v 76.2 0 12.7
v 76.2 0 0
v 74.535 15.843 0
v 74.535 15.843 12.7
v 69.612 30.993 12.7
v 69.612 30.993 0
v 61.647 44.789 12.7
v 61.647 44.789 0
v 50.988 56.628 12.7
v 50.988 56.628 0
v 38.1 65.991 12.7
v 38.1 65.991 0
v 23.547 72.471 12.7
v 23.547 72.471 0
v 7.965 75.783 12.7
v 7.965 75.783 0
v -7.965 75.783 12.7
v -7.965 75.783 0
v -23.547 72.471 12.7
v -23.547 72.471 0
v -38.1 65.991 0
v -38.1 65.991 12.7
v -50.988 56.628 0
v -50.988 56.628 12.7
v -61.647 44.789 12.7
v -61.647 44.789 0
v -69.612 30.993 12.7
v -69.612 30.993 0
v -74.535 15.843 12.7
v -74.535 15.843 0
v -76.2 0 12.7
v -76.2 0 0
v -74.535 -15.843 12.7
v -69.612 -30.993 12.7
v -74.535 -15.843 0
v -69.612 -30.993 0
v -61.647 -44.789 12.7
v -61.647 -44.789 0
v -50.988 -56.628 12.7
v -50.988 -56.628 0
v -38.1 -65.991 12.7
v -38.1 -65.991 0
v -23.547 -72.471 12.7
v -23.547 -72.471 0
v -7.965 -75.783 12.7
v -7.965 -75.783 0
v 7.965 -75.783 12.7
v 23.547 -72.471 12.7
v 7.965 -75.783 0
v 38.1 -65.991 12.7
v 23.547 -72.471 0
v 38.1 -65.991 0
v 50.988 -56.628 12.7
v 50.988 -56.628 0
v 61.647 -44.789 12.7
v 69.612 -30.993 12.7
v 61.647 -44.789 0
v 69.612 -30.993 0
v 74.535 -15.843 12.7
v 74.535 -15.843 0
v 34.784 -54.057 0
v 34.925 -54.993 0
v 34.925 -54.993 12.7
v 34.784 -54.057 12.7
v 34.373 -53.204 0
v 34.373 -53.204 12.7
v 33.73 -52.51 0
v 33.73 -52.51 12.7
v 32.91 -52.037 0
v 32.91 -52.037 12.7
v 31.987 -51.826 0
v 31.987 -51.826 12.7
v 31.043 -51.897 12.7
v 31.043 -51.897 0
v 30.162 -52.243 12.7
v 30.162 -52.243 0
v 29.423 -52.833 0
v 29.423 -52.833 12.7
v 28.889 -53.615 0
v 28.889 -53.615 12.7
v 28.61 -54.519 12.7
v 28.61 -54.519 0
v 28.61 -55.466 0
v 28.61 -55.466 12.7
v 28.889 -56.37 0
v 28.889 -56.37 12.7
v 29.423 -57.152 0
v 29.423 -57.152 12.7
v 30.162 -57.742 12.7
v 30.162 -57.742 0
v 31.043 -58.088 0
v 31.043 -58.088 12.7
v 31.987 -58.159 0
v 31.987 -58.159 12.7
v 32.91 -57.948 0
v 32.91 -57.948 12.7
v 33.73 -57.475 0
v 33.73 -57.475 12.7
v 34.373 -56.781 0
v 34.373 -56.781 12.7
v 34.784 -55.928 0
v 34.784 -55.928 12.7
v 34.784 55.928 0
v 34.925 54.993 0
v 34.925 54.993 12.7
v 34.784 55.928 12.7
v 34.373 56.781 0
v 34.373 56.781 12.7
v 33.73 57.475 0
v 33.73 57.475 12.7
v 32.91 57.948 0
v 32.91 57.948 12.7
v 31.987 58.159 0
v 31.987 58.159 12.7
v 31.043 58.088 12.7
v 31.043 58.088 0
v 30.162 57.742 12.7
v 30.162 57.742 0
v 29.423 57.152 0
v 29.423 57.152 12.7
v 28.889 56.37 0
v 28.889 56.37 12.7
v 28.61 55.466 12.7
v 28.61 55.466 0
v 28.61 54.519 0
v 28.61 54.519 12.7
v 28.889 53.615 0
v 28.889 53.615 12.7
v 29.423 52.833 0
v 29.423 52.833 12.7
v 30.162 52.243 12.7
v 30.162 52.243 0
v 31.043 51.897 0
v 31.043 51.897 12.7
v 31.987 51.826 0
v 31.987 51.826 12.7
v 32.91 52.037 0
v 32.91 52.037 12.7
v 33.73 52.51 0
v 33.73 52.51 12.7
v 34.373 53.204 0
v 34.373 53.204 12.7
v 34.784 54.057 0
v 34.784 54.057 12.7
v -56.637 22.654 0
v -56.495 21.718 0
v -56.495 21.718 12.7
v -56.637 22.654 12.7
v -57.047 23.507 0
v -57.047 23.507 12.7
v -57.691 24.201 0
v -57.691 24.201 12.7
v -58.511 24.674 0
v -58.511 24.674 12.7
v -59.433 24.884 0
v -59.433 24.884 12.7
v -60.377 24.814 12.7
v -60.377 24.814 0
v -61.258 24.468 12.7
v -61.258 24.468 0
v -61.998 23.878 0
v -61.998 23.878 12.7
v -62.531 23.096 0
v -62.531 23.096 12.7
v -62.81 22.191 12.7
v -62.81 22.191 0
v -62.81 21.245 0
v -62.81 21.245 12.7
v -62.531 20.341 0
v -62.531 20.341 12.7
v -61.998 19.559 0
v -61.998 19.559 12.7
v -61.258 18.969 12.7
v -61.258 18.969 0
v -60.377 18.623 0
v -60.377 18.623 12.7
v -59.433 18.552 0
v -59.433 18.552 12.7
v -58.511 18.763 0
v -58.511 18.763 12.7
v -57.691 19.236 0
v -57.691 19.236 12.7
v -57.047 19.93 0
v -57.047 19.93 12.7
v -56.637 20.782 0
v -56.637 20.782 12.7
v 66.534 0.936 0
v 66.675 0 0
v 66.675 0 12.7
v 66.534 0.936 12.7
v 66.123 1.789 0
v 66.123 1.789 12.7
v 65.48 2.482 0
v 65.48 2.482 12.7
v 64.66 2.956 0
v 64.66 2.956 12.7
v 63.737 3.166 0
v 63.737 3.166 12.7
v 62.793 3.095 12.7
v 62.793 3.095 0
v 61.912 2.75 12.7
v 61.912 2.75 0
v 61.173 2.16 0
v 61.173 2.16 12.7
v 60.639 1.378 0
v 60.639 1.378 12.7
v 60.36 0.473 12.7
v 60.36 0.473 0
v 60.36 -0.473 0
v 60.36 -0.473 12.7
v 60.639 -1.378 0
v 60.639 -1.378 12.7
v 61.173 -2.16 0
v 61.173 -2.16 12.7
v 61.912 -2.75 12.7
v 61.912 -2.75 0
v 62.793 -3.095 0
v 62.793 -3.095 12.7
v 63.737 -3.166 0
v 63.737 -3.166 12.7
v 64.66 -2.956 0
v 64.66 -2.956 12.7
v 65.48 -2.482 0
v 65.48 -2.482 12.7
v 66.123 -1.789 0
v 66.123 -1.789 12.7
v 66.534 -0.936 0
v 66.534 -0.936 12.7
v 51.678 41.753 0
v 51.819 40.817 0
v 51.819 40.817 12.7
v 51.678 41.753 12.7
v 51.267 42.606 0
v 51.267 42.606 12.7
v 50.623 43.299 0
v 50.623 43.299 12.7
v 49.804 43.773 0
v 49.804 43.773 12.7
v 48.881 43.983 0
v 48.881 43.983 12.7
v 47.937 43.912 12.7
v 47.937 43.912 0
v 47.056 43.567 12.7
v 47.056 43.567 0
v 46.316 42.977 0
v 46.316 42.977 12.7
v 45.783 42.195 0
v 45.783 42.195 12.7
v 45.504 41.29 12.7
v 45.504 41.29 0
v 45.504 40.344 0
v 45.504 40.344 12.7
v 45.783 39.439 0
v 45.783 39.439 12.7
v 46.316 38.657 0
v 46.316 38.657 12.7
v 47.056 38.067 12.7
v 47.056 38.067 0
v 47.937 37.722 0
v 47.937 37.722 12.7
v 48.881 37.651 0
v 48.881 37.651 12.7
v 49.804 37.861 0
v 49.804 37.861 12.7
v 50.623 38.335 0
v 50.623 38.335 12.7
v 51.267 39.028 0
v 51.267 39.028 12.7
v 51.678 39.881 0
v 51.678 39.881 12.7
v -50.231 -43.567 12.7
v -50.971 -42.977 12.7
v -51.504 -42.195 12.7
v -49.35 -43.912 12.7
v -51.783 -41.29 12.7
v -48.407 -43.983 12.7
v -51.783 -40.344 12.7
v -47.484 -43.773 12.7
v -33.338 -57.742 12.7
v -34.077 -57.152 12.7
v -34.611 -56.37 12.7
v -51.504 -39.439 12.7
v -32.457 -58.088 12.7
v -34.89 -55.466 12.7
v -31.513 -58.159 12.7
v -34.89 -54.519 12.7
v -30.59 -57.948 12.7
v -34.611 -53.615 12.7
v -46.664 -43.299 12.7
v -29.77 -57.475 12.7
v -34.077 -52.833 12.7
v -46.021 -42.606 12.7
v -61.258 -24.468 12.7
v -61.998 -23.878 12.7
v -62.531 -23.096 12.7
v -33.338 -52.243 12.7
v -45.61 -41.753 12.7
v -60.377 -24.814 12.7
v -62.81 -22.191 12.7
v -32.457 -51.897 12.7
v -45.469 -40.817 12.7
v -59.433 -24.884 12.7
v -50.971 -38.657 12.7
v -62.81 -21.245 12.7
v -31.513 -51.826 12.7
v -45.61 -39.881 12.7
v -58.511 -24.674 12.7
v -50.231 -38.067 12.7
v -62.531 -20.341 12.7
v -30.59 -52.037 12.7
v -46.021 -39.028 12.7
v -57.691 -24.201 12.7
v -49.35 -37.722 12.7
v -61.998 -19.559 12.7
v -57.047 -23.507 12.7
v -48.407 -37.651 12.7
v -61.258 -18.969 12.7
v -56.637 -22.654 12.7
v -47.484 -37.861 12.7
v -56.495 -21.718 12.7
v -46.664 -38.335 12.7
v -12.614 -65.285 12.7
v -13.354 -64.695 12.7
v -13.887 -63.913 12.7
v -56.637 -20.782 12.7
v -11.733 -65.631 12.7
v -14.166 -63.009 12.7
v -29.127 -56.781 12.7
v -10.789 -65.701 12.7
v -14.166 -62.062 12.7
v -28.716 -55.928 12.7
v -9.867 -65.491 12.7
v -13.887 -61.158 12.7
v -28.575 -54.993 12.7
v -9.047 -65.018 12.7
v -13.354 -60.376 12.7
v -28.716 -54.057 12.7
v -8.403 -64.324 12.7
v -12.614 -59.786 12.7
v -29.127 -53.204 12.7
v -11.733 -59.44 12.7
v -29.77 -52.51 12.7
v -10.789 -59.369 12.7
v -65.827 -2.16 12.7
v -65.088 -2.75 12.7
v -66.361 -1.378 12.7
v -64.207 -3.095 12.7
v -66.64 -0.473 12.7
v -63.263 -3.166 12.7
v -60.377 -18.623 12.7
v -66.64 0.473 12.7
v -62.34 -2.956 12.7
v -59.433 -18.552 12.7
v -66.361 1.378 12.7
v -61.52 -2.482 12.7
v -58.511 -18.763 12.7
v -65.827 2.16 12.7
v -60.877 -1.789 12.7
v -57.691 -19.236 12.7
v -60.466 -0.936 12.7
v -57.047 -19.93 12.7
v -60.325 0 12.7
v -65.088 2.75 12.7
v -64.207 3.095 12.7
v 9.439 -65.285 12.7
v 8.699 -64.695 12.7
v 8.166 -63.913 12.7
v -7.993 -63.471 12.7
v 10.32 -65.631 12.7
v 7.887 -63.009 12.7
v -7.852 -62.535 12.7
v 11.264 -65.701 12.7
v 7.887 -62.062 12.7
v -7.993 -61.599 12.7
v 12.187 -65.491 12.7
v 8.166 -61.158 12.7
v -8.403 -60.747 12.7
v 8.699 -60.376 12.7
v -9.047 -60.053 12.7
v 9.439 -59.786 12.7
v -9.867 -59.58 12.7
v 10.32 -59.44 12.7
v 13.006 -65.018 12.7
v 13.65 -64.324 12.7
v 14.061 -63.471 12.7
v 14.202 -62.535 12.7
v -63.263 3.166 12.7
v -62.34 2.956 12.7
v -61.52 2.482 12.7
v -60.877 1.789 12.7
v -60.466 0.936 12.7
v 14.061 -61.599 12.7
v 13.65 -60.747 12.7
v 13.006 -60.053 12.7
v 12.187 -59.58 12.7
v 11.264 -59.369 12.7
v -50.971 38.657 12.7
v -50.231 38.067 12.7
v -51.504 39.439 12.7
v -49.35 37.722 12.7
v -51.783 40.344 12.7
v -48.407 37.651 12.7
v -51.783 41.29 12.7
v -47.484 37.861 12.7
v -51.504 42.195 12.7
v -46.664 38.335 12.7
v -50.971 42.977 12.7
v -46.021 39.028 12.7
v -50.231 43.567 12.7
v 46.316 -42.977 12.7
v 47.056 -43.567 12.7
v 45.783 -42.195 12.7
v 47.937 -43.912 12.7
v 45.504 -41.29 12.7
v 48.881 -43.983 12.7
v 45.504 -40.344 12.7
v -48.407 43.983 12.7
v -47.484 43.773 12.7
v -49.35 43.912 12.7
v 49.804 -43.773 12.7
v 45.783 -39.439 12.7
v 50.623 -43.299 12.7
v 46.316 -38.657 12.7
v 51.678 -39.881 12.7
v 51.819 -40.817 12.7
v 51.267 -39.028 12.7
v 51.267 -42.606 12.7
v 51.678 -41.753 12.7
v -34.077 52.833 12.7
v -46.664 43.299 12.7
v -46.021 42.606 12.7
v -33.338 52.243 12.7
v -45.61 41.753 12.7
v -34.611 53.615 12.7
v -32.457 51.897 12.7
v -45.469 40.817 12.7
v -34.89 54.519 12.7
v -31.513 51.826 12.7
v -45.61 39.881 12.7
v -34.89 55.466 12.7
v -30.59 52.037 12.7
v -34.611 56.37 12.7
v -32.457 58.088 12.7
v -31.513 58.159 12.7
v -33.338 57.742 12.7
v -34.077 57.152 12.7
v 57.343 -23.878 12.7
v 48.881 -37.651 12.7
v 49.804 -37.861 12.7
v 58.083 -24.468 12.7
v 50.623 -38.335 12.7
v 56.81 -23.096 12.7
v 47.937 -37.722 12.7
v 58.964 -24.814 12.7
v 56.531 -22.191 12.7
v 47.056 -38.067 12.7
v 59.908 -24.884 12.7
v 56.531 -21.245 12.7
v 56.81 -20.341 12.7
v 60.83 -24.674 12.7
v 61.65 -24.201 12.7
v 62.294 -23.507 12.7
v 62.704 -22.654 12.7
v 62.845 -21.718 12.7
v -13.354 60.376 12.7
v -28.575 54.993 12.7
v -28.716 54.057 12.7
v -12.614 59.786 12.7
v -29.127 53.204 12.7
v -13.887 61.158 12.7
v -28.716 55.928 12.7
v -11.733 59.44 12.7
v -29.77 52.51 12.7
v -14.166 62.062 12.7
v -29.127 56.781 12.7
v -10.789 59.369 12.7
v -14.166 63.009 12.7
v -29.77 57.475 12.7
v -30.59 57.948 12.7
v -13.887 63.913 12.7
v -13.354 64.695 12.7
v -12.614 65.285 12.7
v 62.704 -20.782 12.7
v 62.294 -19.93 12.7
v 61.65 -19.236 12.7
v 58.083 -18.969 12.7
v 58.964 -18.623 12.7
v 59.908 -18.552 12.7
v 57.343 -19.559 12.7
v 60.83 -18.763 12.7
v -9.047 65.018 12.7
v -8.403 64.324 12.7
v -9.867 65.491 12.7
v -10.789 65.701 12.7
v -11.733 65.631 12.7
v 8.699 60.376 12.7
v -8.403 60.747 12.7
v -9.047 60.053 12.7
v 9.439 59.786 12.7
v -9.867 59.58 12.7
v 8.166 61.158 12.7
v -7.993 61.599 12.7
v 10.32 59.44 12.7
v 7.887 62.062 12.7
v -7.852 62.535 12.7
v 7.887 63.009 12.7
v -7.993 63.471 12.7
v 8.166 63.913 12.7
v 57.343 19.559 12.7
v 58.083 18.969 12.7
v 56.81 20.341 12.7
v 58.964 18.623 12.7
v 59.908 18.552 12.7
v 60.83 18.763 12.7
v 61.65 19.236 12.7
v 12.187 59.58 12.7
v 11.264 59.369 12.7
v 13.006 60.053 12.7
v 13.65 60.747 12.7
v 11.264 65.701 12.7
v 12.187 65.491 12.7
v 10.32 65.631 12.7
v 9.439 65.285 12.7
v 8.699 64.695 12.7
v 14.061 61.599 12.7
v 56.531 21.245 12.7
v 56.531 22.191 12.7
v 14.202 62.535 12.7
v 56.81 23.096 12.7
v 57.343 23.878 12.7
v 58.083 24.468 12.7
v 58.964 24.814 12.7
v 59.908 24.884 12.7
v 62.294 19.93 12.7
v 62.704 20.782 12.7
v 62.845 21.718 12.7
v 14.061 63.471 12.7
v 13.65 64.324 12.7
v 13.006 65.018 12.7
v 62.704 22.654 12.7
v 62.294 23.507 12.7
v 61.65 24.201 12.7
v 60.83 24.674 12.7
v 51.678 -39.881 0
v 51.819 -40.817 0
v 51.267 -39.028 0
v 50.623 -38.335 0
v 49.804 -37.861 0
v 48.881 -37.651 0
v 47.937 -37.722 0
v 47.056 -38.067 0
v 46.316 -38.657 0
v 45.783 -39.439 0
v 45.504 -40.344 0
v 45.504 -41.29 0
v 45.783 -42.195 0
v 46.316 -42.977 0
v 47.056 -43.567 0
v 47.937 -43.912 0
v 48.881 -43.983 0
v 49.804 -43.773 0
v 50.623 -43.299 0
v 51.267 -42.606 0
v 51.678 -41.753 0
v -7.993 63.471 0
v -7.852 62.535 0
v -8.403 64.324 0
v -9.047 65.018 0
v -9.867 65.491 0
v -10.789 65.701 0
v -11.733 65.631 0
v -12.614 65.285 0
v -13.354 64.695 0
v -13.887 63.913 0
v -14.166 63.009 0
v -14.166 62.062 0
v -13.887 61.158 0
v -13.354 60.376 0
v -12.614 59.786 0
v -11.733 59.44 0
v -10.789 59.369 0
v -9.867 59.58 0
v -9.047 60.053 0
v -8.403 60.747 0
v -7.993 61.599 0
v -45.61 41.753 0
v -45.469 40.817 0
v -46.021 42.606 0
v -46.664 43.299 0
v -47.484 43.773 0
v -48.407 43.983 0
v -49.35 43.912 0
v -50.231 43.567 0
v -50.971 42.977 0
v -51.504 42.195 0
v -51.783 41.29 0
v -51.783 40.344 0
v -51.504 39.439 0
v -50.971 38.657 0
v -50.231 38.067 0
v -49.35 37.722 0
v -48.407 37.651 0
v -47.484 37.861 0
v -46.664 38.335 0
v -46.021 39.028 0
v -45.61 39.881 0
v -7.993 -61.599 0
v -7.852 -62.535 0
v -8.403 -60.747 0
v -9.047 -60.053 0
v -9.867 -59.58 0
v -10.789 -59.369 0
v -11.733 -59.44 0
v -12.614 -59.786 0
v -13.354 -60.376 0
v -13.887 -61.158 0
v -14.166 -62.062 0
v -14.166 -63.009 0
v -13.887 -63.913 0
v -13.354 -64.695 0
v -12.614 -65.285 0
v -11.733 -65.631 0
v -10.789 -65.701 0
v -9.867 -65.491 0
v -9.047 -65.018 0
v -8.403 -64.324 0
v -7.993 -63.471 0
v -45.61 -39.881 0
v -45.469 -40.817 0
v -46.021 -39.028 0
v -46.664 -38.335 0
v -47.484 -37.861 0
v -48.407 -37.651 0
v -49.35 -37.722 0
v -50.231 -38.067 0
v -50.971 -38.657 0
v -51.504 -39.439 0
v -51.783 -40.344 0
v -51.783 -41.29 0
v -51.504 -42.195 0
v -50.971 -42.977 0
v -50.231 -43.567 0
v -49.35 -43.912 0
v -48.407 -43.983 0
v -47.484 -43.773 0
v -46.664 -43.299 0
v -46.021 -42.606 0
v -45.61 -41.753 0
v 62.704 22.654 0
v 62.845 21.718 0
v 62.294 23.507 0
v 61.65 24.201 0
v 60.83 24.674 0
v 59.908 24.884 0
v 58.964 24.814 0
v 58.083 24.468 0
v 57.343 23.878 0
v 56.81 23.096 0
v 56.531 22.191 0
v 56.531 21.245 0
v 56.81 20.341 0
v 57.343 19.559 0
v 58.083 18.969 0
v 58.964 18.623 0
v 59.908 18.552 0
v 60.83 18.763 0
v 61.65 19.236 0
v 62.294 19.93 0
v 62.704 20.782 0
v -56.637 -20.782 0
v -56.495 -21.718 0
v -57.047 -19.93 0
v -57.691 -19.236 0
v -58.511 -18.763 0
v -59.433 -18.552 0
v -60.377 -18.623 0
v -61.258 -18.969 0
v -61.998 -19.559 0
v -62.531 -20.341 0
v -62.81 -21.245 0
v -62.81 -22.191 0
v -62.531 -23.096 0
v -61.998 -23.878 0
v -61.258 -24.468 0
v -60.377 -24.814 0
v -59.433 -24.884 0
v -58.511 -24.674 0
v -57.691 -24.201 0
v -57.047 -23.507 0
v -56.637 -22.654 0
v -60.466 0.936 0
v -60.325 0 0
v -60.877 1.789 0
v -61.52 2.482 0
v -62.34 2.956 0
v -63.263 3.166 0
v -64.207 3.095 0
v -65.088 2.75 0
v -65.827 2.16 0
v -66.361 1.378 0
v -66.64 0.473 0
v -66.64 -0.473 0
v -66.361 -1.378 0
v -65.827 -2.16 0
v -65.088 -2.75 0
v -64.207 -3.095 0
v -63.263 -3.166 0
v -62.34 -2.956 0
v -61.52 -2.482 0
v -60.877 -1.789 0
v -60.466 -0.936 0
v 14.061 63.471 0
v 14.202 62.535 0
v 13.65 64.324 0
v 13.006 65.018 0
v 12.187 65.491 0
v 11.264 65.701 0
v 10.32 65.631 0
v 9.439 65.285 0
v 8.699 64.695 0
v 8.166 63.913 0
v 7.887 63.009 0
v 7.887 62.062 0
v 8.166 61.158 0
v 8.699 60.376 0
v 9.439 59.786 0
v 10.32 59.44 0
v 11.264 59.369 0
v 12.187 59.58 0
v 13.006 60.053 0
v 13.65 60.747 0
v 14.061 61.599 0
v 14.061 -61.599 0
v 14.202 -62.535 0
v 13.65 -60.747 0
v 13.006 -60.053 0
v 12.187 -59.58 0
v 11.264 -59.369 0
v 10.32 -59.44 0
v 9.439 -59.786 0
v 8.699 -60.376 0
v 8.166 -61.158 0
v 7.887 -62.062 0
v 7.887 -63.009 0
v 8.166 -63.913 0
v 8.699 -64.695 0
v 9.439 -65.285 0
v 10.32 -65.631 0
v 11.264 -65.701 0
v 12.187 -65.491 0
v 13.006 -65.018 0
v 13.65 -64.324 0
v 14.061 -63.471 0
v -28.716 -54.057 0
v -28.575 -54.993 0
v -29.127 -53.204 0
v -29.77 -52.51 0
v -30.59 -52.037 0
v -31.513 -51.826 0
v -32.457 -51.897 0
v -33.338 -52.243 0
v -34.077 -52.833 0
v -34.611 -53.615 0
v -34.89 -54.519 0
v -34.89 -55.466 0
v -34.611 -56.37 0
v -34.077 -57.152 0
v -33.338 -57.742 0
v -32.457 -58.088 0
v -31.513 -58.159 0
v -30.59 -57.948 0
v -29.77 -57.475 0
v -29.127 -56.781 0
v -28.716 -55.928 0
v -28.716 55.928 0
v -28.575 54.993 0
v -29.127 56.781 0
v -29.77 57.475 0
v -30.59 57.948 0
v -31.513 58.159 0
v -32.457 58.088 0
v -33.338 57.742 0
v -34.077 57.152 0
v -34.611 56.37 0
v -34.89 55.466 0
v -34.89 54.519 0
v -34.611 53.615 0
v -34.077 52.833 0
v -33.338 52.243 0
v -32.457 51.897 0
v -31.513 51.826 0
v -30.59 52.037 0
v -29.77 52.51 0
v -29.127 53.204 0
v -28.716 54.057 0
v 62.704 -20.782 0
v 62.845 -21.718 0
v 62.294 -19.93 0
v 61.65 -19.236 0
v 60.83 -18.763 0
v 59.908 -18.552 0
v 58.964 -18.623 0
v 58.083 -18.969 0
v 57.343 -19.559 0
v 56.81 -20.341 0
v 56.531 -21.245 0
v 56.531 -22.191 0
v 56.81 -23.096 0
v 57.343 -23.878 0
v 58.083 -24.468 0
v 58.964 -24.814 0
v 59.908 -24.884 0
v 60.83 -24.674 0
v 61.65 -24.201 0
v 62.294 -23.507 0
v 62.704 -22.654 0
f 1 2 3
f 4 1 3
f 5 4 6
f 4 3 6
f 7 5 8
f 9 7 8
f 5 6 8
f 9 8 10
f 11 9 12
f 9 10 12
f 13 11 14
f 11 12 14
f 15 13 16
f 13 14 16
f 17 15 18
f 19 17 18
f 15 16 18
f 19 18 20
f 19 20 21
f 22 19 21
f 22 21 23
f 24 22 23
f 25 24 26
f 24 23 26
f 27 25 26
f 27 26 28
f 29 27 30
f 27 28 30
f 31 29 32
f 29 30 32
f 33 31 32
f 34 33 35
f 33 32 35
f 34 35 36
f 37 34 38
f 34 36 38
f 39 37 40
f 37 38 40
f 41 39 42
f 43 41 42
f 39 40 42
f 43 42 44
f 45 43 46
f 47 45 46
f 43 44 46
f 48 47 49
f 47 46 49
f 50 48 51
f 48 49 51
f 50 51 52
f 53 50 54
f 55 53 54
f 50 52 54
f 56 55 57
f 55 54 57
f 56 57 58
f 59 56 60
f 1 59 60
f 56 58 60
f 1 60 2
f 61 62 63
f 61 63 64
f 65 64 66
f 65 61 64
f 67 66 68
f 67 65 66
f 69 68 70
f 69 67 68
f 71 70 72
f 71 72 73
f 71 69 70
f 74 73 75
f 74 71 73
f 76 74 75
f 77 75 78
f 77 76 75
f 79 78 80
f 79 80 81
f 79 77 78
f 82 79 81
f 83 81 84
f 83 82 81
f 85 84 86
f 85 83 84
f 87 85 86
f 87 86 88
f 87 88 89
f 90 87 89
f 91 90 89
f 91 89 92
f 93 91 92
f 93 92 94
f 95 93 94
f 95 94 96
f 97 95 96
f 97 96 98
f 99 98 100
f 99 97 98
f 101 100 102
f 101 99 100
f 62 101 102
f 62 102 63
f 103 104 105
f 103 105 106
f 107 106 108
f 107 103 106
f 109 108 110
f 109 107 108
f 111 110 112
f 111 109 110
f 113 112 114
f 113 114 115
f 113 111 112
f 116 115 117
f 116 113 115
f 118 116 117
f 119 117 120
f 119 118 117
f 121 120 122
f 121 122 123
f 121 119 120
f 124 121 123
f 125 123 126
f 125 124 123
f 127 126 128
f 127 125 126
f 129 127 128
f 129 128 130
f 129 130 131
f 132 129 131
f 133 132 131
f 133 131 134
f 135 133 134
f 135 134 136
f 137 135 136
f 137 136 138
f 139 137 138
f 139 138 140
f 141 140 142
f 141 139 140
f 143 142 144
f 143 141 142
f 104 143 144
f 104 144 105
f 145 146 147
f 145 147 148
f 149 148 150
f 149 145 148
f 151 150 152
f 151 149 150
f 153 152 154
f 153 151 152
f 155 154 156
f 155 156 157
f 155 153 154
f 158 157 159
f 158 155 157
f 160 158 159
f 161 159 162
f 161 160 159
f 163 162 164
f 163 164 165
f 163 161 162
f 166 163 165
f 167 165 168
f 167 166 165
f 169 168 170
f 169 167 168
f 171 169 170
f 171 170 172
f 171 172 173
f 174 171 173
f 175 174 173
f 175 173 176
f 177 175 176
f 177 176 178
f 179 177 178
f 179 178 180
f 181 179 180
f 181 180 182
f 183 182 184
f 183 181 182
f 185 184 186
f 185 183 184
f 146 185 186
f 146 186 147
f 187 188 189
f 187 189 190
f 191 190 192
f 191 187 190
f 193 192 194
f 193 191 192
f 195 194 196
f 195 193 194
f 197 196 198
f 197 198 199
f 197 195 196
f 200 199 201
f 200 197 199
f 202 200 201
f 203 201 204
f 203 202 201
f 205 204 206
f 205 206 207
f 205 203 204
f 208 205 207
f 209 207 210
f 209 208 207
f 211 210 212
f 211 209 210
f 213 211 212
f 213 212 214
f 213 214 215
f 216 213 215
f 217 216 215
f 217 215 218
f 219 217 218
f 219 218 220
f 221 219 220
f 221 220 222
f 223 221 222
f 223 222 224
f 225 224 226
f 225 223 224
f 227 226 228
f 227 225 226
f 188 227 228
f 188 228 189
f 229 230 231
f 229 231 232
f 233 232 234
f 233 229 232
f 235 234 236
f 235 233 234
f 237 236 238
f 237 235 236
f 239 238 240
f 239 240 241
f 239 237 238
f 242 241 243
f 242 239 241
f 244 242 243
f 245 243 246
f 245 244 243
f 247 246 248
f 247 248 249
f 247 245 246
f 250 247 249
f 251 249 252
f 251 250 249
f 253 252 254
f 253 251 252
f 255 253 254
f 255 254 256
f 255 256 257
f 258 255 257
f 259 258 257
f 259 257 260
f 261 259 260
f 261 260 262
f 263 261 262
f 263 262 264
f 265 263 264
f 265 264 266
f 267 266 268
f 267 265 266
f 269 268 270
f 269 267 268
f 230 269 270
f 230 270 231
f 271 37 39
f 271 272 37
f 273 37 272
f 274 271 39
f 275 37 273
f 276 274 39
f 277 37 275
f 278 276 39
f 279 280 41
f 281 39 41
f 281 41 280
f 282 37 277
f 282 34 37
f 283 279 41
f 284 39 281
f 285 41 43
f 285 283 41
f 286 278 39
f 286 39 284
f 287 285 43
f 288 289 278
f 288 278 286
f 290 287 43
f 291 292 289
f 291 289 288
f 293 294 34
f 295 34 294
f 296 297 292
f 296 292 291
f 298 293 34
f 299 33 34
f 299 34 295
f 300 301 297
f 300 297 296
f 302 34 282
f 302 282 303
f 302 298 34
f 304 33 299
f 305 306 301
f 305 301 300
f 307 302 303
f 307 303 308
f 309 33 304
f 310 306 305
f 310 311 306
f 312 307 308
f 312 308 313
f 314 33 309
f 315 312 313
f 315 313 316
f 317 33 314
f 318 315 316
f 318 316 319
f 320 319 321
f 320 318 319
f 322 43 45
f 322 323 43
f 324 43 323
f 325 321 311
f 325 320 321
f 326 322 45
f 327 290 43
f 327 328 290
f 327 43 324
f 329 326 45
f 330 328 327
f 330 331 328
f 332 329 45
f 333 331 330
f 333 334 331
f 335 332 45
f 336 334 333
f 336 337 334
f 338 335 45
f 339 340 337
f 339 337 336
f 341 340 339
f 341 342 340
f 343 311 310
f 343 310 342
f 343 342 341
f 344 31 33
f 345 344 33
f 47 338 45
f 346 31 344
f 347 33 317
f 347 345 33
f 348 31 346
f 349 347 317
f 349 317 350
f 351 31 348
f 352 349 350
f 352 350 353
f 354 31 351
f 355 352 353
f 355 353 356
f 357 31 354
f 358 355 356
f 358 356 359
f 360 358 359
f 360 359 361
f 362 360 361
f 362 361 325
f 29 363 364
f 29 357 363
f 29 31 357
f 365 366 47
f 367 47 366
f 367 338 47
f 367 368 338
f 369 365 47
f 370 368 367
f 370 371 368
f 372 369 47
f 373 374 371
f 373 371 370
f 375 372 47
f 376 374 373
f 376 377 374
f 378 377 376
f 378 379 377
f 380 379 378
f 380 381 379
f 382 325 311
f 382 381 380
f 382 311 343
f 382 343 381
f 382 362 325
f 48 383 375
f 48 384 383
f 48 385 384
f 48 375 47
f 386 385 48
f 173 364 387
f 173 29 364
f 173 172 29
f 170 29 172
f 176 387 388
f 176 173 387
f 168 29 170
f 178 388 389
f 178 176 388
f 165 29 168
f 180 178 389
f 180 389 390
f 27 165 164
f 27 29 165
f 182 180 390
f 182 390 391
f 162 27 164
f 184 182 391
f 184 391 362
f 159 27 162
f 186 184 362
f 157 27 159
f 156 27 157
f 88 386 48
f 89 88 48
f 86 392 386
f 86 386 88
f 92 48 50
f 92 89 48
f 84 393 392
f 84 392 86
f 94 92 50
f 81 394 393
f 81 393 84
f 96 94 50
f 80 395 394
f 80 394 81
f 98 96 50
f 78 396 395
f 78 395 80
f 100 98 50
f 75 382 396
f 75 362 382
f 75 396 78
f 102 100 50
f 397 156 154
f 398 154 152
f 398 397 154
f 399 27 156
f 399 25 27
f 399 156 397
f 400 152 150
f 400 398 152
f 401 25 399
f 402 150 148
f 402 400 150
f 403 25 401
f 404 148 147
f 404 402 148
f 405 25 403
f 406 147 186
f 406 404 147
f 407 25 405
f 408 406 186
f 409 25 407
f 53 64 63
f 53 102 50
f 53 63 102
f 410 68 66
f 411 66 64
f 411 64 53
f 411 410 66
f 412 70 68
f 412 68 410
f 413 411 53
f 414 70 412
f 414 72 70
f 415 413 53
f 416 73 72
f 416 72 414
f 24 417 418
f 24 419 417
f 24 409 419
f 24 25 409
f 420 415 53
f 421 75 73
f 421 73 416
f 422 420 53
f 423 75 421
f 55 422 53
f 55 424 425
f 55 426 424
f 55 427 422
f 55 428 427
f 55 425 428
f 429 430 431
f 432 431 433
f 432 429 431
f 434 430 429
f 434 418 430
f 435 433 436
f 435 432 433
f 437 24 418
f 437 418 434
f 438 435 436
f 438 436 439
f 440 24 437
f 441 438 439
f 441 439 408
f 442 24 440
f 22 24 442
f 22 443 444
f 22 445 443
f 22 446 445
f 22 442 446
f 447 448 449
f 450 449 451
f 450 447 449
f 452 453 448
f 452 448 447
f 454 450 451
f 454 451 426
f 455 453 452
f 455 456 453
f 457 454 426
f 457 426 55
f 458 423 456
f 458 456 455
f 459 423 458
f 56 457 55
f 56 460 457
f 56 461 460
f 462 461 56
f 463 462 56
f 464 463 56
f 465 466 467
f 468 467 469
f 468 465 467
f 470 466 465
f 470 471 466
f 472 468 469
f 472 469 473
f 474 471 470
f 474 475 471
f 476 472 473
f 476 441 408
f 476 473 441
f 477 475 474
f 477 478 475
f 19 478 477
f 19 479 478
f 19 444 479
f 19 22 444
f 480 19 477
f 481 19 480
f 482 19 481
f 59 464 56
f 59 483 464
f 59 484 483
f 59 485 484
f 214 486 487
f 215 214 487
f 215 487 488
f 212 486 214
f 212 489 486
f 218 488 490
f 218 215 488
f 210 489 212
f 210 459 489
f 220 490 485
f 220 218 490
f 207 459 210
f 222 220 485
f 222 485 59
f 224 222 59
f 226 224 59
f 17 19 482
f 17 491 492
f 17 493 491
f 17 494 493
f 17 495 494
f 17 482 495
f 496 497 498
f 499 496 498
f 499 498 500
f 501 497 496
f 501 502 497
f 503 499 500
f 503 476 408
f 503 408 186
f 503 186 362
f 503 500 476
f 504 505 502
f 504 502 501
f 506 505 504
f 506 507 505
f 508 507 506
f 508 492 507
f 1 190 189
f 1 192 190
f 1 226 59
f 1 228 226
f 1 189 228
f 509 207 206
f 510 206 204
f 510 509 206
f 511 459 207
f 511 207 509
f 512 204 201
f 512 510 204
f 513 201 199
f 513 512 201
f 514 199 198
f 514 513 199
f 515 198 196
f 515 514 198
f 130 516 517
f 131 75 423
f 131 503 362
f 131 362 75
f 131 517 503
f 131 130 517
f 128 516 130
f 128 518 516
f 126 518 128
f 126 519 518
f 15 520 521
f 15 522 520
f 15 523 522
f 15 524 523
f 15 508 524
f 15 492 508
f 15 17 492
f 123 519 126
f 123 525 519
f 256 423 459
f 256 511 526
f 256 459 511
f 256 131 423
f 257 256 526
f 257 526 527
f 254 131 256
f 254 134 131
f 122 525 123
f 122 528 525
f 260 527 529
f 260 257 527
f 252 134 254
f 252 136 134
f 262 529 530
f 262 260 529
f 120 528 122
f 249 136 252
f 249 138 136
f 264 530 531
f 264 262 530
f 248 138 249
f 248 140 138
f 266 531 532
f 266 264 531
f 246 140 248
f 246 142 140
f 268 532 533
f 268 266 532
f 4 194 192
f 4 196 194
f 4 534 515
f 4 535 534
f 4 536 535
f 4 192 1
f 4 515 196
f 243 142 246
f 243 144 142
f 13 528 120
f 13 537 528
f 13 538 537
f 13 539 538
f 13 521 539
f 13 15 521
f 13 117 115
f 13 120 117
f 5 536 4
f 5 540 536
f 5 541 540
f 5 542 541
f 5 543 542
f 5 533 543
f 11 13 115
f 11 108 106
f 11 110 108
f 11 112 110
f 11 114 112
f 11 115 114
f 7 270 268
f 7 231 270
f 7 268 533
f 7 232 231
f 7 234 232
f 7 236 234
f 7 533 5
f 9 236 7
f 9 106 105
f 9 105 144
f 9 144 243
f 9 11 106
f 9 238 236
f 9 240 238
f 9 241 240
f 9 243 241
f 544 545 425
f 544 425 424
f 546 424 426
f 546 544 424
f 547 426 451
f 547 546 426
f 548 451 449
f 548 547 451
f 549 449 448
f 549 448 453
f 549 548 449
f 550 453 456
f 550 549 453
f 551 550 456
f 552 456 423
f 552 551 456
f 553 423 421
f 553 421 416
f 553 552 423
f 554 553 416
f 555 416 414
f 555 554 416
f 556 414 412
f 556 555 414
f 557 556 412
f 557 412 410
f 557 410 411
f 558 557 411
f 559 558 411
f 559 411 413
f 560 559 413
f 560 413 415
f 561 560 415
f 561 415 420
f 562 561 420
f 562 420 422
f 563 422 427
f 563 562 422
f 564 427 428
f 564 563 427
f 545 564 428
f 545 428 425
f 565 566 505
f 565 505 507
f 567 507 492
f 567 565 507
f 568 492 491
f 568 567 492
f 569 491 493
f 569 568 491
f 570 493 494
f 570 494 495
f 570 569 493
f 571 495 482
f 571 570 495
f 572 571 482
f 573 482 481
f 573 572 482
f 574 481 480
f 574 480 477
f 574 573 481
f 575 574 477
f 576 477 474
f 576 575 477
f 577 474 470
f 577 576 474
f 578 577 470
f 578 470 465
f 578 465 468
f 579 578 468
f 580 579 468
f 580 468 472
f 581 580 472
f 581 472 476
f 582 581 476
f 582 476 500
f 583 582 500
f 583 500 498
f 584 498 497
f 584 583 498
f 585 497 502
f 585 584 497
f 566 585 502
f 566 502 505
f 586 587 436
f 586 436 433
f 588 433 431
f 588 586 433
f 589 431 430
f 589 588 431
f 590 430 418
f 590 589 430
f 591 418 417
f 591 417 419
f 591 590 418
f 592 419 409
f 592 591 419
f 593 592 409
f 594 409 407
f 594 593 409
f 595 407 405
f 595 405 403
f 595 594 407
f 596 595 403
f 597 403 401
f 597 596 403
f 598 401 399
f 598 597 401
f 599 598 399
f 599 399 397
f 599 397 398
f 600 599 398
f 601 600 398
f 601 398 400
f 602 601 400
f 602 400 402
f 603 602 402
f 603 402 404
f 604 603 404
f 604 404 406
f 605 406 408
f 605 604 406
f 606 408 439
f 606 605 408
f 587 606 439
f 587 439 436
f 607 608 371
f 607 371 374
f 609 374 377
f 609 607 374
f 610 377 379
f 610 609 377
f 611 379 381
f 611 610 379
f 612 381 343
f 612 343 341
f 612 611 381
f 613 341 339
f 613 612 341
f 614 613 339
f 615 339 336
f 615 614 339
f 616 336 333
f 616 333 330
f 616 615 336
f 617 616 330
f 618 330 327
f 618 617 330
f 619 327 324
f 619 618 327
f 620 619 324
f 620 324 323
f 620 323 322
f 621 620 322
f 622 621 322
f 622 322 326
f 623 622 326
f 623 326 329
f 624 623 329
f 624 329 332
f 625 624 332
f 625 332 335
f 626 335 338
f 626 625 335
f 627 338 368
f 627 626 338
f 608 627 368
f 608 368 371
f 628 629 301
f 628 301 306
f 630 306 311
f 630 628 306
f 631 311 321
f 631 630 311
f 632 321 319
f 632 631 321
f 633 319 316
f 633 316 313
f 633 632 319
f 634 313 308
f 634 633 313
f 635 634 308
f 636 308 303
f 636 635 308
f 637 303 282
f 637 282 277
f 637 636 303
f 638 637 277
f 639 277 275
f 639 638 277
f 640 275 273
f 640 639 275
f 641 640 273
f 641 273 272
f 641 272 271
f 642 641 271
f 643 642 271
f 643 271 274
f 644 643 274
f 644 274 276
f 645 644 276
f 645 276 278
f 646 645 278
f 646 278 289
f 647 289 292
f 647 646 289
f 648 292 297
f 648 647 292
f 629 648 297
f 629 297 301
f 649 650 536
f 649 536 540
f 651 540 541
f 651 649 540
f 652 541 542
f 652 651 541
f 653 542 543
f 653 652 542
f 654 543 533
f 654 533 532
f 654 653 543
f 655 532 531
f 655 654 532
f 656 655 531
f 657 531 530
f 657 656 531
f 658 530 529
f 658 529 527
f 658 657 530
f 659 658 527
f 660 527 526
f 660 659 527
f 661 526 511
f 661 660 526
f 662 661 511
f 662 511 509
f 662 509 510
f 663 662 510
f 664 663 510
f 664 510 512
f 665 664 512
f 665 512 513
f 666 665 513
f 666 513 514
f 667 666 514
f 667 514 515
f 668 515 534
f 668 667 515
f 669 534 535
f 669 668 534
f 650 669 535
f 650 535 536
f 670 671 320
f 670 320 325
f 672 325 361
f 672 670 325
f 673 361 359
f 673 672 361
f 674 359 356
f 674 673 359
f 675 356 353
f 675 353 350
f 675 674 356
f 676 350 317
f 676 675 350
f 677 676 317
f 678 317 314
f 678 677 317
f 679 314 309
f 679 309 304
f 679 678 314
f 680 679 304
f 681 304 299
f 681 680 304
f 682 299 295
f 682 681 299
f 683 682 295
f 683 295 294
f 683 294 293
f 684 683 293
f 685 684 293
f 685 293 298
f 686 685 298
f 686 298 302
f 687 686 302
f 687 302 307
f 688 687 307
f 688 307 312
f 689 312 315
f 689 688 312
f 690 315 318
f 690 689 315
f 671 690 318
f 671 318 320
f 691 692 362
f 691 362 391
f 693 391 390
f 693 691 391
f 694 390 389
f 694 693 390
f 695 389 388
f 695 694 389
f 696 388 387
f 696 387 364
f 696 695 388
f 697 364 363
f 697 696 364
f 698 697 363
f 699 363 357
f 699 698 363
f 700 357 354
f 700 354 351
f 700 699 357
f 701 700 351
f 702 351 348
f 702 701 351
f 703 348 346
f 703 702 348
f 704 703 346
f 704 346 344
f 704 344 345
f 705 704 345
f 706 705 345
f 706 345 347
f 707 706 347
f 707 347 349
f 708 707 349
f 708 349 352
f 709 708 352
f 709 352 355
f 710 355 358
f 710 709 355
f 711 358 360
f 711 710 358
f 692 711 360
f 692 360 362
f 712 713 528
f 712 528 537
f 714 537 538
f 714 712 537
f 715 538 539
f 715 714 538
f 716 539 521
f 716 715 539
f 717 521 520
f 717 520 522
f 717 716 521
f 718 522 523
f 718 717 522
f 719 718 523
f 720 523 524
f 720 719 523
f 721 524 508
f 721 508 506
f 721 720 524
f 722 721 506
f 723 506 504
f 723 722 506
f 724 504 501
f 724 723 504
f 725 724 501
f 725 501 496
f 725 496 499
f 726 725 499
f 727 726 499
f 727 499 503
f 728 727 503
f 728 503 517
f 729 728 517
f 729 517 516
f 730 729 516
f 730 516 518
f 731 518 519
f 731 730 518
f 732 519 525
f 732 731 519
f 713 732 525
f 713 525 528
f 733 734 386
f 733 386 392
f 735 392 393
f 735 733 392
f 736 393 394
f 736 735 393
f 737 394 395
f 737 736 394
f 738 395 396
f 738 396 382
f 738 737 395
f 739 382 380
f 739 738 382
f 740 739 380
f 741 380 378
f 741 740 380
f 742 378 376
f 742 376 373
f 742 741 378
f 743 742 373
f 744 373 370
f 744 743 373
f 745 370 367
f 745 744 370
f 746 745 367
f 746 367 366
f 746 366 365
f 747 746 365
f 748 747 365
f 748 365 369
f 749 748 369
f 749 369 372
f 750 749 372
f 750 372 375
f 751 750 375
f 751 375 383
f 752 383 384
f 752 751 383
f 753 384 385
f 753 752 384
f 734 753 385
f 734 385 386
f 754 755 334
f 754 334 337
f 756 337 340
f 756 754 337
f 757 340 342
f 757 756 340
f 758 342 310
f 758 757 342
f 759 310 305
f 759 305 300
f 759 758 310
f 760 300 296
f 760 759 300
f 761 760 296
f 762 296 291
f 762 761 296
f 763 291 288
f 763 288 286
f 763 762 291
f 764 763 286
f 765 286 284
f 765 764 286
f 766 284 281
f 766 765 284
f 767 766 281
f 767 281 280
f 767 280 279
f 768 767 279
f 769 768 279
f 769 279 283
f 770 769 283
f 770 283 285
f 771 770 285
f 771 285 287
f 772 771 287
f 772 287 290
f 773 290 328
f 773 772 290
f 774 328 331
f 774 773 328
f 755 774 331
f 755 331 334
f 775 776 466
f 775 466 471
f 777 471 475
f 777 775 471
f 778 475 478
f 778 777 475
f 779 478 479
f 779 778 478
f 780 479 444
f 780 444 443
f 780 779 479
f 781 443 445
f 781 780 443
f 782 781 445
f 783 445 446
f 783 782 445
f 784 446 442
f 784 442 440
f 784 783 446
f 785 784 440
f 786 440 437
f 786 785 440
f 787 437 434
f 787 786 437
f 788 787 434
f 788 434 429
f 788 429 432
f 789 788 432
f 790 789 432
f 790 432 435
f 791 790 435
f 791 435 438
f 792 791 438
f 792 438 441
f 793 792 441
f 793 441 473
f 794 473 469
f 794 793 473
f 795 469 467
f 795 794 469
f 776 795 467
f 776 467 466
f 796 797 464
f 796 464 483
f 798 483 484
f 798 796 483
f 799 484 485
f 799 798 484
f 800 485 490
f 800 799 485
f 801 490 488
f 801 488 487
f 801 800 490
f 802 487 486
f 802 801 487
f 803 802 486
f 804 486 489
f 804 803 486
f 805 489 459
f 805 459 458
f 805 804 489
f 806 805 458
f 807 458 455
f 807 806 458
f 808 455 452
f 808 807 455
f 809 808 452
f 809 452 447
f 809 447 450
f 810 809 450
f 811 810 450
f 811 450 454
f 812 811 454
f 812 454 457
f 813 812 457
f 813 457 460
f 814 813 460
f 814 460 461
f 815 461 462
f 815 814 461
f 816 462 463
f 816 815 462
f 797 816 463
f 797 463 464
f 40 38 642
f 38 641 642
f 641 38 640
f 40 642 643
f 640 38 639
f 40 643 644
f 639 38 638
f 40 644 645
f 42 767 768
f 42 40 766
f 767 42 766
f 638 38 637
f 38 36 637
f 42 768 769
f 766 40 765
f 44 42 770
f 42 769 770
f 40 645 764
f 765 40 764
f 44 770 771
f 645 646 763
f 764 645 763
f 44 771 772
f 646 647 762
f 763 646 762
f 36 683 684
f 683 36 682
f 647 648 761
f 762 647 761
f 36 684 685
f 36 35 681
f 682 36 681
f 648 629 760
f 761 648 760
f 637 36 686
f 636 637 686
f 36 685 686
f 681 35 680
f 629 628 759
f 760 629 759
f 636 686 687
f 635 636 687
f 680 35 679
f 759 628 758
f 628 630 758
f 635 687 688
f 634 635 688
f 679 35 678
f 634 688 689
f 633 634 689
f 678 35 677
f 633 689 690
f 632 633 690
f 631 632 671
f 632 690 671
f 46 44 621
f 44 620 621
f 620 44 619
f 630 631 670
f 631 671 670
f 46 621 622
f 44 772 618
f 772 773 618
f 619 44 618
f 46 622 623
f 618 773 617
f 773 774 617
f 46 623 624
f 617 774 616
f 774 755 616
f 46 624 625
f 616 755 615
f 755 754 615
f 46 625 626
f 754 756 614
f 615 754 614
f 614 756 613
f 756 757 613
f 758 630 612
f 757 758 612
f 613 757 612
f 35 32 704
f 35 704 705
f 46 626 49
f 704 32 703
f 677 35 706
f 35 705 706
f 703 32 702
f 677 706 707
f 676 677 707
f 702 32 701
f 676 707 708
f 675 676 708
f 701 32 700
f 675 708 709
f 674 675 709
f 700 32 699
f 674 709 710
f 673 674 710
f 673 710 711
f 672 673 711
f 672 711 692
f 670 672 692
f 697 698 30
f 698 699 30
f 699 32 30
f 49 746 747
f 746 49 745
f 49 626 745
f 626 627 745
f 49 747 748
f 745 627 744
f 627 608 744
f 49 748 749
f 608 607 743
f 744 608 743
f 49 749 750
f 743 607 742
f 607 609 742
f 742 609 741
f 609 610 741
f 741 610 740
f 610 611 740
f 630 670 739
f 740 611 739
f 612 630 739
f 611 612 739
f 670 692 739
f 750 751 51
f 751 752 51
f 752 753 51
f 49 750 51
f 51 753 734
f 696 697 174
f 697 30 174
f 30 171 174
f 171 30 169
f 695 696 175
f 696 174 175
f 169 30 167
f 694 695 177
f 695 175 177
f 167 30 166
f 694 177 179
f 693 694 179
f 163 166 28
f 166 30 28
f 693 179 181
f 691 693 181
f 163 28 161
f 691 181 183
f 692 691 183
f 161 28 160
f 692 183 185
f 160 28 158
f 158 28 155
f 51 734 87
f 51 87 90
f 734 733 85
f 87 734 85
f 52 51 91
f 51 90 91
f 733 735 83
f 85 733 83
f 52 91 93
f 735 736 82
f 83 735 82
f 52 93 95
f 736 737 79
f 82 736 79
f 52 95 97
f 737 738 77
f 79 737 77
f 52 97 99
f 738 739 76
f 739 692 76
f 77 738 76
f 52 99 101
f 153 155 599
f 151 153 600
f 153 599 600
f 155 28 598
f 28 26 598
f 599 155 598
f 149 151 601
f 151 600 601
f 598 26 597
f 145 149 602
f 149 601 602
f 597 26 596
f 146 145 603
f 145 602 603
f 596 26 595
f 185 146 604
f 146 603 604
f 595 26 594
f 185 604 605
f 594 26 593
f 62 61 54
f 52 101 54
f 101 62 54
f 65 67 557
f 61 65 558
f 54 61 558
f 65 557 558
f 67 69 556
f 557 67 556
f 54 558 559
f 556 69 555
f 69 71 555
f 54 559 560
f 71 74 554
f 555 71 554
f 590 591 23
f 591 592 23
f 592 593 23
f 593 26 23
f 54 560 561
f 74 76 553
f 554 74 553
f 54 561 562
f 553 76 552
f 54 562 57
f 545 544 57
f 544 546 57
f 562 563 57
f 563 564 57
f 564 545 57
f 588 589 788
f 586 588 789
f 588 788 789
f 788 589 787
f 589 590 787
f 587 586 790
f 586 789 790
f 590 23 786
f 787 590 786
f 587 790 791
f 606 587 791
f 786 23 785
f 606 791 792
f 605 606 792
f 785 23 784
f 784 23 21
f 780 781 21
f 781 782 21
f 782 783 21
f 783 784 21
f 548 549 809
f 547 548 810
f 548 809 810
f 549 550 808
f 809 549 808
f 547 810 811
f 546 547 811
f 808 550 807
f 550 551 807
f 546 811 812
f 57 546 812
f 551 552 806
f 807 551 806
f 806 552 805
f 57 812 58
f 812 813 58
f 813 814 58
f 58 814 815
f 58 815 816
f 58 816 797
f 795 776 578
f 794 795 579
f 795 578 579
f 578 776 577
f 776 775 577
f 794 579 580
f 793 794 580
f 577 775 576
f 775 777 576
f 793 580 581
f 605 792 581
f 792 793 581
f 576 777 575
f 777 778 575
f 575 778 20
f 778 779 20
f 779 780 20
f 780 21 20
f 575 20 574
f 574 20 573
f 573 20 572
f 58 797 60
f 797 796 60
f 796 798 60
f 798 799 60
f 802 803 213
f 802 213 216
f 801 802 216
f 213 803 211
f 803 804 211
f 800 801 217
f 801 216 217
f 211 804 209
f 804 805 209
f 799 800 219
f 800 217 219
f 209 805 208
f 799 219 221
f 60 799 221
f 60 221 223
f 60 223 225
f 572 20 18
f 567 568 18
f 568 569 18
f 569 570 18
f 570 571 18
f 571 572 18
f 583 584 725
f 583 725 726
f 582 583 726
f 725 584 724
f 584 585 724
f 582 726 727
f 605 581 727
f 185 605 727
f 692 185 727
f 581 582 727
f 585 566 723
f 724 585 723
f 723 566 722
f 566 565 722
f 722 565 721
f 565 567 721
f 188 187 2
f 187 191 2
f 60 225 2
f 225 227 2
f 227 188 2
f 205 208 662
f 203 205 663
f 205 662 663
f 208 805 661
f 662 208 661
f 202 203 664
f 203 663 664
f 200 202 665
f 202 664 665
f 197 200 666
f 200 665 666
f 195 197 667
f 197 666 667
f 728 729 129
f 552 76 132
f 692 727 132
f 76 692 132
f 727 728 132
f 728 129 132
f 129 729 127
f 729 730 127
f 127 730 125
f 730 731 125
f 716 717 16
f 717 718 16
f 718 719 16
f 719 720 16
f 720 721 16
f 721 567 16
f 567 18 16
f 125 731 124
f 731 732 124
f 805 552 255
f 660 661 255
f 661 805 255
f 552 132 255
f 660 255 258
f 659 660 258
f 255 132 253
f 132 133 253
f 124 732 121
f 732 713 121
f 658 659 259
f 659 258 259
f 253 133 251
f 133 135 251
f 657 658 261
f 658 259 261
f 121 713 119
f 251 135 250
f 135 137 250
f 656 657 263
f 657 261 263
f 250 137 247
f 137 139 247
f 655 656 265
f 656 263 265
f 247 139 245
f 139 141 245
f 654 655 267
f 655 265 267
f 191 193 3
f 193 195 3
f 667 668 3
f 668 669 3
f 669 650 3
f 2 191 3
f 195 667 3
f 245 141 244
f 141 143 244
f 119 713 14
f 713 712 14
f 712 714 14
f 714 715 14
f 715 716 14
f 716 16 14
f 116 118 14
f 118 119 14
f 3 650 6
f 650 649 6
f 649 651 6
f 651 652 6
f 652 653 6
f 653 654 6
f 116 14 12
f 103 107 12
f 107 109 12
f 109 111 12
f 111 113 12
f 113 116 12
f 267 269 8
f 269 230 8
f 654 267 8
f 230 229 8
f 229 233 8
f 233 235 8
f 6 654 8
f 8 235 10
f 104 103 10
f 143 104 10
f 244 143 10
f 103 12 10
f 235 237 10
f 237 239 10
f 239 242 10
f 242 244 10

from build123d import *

# Parameters (mm, degrees)
SKETCH1_R           = 76.2
SKETCH1_R_2         = 3.175
BOSS_EXTRUDE1_DEPTH = 12.7


with BuildPart() as part:
    # Sketch1 → Boss-Extrude1 (new body)
    with BuildSketch(Plane.XY):
        Circle(SKETCH1_R)
        with Locations((-63.5, 0)):
            Circle(SKETCH1_R_2, mode=Mode.SUBTRACT)
        with Locations((-59.67048142, 21.718279101)):
            Circle(SKETCH1_R_2, mode=Mode.SUBTRACT)
        with Locations((-48.643822138, 40.817013215)):
            Circle(SKETCH1_R_2, mode=Mode.SUBTRACT)
        with Locations((-31.75, 54.99261314)):
            Circle(SKETCH1_R_2, mode=Mode.SUBTRACT)
        with Locations((-11.026659282, 62.535292316)):
            Circle(SKETCH1_R_2, mode=Mode.SUBTRACT)
        with Locations((11.026659282, 62.535292316)):
            Circle(SKETCH1_R_2, mode=Mode.SUBTRACT)
        with Locations((31.75, 54.99261314)):
            Circle(SKETCH1_R_2, mode=Mode.SUBTRACT)
        with Locations((48.643822138, 40.817013215)):
            Circle(SKETCH1_R_2, mode=Mode.SUBTRACT)
        with Locations((59.67048142, 21.718279101)):
            Circle(SKETCH1_R_2, mode=Mode.SUBTRACT)
        with Locations((63.5, 0)):
            Circle(SKETCH1_R_2, mode=Mode.SUBTRACT)
        with Locations((59.67048142, -21.718279101)):
            Circle(SKETCH1_R_2, mode=Mode.SUBTRACT)
        with Locations((48.643822138, -40.817013215)):
            Circle(SKETCH1_R_2, mode=Mode.SUBTRACT)
        with Locations((31.75, -54.99261314)):
            Circle(SKETCH1_R_2, mode=Mode.SUBTRACT)
        with Locations((11.026659282, -62.535292316)):
            Circle(SKETCH1_R_2, mode=Mode.SUBTRACT)
        with Locations((-11.026659282, -62.535292316)):
            Circle(SKETCH1_R_2, mode=Mode.SUBTRACT)
        with Locations((-31.75, -54.99261314)):
            Circle(SKETCH1_R_2, mode=Mode.SUBTRACT)
        with Locations((-48.643822138, -40.817013215)):
            Circle(SKETCH1_R_2, mode=Mode.SUBTRACT)
        with Locations((-59.67048142, -21.718279101)):
            Circle(SKETCH1_R_2, mode=Mode.SUBTRACT)
    extrude(amount=BOSS_EXTRUDE1_DEPTH)


solid = part.part
